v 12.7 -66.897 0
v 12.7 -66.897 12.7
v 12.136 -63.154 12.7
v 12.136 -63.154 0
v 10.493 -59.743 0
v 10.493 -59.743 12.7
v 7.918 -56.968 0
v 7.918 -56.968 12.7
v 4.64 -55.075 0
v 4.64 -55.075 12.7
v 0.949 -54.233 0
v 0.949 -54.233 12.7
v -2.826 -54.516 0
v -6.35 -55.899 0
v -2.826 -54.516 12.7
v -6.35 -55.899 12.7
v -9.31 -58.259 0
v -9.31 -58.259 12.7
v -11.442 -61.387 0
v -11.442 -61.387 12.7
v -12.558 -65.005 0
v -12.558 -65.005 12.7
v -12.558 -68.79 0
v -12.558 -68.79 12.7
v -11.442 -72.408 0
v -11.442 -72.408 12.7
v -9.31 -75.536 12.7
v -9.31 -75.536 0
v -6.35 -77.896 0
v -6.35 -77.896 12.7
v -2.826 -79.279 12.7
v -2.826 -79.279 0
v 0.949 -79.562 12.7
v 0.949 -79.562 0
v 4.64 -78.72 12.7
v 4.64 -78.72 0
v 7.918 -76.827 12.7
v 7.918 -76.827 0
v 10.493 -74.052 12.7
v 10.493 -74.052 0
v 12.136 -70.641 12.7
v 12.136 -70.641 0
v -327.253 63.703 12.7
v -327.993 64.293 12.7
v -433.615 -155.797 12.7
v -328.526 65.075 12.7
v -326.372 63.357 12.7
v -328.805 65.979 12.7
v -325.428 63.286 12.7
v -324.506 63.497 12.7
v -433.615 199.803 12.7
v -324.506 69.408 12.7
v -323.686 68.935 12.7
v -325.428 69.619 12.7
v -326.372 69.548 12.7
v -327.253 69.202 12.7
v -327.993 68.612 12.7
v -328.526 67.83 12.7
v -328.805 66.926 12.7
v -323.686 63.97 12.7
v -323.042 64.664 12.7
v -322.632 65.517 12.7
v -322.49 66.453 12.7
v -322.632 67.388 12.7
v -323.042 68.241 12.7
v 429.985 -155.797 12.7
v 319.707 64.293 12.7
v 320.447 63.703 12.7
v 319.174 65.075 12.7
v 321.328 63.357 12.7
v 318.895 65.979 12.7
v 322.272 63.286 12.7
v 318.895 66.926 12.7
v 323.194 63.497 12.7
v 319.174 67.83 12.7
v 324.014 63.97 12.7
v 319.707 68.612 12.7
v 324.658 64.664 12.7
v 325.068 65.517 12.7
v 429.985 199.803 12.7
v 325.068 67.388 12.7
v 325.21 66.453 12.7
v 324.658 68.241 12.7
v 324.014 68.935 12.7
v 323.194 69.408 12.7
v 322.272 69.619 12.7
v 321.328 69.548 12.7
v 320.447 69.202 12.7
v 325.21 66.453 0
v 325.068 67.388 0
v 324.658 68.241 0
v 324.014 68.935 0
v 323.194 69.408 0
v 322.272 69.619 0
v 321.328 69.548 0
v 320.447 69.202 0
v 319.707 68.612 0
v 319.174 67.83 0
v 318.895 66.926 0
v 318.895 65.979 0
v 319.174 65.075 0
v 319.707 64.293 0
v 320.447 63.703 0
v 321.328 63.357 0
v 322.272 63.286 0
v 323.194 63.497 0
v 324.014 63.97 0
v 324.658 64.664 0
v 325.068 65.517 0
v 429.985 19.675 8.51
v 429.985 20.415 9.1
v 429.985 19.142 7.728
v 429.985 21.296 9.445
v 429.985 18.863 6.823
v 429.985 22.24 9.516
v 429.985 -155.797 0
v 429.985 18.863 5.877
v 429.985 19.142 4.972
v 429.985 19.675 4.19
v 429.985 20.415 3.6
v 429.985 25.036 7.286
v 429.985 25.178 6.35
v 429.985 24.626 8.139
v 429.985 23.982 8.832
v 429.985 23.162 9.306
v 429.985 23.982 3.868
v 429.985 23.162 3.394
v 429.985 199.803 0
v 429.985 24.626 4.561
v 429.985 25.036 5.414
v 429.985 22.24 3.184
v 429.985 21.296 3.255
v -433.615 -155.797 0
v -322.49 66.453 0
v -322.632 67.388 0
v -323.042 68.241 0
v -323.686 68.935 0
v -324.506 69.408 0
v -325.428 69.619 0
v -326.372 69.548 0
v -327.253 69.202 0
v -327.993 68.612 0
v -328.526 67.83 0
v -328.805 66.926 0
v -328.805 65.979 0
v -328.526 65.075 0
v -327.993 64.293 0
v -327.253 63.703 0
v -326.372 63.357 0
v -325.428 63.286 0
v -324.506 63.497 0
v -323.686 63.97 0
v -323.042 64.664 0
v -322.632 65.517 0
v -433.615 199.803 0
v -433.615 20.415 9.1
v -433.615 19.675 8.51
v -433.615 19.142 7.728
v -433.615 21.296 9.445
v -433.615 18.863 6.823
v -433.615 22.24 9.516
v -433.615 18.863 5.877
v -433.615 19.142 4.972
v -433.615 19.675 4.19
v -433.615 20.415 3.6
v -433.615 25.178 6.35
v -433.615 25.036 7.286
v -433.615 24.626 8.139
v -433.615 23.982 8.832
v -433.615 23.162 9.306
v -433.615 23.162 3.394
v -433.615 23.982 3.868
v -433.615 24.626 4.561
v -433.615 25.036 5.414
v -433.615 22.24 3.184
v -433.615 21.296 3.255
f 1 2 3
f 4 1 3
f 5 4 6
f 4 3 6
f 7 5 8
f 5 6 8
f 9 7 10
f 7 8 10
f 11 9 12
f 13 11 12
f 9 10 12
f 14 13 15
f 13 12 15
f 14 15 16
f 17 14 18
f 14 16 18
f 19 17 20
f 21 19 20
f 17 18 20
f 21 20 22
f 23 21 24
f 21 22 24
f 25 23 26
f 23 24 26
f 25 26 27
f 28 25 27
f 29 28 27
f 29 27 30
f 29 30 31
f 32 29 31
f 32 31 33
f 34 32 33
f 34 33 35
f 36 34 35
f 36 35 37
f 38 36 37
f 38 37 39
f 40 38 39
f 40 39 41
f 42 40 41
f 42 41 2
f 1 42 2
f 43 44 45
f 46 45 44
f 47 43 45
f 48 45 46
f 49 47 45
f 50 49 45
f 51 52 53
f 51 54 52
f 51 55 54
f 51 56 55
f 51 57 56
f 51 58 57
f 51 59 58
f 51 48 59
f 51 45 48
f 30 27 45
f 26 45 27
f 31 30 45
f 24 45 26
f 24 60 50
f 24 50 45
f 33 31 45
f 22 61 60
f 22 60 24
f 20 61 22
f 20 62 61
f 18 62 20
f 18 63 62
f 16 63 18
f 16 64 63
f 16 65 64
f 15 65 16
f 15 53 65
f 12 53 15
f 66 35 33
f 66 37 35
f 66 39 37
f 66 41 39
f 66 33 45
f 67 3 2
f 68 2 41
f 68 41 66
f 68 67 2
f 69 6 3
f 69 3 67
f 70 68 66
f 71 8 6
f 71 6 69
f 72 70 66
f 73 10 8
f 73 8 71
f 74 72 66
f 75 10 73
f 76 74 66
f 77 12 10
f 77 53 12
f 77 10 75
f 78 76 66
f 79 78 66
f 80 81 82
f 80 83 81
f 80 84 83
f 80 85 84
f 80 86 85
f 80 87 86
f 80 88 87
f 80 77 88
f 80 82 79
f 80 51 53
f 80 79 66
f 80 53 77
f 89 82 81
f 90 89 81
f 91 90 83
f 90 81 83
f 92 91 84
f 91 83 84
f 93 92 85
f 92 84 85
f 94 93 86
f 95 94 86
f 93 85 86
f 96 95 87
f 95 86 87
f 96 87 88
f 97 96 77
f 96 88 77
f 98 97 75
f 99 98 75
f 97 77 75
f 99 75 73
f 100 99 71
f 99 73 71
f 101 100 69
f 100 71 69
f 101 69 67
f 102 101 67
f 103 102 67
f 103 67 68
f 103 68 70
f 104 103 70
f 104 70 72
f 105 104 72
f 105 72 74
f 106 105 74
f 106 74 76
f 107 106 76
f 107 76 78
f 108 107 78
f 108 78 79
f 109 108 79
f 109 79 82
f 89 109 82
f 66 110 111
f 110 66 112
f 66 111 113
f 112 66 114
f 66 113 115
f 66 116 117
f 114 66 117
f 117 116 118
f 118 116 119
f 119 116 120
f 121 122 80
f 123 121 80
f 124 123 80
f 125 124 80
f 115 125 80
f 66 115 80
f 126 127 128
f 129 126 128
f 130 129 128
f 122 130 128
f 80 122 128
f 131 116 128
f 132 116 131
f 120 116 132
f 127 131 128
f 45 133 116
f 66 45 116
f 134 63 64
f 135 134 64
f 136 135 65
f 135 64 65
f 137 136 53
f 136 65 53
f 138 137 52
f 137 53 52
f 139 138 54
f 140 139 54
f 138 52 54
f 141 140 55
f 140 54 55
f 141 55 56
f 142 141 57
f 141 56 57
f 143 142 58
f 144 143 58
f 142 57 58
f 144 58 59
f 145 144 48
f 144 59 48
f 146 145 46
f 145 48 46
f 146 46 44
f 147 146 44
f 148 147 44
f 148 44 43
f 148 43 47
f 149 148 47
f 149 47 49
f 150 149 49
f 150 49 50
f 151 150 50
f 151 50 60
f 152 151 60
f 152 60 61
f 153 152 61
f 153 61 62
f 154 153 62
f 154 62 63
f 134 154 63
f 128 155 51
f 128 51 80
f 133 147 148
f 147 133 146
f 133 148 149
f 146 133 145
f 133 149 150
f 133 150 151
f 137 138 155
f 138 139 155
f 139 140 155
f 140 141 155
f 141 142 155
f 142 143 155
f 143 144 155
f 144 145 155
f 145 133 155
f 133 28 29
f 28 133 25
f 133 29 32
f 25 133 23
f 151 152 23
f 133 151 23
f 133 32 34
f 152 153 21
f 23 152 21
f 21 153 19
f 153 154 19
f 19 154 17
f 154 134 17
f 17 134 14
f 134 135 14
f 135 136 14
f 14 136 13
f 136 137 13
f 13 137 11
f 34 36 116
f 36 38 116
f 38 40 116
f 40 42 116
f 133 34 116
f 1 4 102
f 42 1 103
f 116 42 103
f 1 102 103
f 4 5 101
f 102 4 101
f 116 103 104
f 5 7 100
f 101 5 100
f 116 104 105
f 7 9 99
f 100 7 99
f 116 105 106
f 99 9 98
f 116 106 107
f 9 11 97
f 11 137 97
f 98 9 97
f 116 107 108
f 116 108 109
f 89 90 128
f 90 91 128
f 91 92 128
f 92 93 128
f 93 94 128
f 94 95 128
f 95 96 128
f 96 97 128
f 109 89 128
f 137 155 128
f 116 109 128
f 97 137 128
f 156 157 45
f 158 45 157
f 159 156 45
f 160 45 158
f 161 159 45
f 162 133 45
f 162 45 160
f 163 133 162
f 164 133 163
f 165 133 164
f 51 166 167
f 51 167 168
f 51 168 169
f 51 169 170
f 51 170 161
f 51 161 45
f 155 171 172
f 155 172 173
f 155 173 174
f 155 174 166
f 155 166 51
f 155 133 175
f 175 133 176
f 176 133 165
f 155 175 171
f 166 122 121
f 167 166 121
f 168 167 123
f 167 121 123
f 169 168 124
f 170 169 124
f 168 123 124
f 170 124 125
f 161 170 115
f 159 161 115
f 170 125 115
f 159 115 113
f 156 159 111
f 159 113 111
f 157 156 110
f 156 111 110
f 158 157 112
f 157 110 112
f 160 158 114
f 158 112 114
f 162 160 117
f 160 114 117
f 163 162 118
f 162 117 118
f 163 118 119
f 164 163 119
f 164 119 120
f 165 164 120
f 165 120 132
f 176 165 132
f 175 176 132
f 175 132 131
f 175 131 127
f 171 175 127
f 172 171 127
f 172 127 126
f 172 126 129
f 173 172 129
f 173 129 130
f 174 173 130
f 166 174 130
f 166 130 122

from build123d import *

# Parameters (mm, degrees)
F0_W     = 863.6
F0_H     = 355.6
F1_DEPTH = 12.7
F2_R     = 3.175
F3_DEPTH = 863.601
F4_R     = 12.7
F5_DEPTH = 25.4
F4_R_2   = 3.175
F6_DEPTH = 12.701


with BuildPart() as f1:
    # F0 (on Top) → F1 (new body)
    with BuildSketch(Plane.XY):
        with Locations((-1.815464, 22.002507)):
            Rectangle(F0_W, F0_H)
    extrude(amount=F1_DEPTH)

    # F2 (on face) → F3 (cut, through all)
    with BuildSketch(Plane.YZ.offset(429.984536)):
        with Locations((22.002507, 6.35)):
            Circle(F2_R)
    extrude(amount=-F3_DEPTH, mode=Mode.SUBTRACT)

    # F4 (on face) → F5 (cut)
    with BuildSketch(Plane.XY.offset(12.7)):
        with Locations((0, -66.897493)):
            Circle(F4_R)
    extrude(amount=-F5_DEPTH, mode=Mode.SUBTRACT)

    # F4 (on face) → F6 (cut, through all)
    with BuildSketch(Plane.XY.offset(12.7)):
        with Locations((0, -66.897493)):
            Circle(F4_R)
        with Locations((-325.665464, 66.452507)):
            Circle(F4_R_2)
        with Locations((322.034536, 66.452507)):
            Circle(F4_R_2)
    extrude(amount=-F6_DEPTH, mode=Mode.SUBTRACT)


solid = f1.part
